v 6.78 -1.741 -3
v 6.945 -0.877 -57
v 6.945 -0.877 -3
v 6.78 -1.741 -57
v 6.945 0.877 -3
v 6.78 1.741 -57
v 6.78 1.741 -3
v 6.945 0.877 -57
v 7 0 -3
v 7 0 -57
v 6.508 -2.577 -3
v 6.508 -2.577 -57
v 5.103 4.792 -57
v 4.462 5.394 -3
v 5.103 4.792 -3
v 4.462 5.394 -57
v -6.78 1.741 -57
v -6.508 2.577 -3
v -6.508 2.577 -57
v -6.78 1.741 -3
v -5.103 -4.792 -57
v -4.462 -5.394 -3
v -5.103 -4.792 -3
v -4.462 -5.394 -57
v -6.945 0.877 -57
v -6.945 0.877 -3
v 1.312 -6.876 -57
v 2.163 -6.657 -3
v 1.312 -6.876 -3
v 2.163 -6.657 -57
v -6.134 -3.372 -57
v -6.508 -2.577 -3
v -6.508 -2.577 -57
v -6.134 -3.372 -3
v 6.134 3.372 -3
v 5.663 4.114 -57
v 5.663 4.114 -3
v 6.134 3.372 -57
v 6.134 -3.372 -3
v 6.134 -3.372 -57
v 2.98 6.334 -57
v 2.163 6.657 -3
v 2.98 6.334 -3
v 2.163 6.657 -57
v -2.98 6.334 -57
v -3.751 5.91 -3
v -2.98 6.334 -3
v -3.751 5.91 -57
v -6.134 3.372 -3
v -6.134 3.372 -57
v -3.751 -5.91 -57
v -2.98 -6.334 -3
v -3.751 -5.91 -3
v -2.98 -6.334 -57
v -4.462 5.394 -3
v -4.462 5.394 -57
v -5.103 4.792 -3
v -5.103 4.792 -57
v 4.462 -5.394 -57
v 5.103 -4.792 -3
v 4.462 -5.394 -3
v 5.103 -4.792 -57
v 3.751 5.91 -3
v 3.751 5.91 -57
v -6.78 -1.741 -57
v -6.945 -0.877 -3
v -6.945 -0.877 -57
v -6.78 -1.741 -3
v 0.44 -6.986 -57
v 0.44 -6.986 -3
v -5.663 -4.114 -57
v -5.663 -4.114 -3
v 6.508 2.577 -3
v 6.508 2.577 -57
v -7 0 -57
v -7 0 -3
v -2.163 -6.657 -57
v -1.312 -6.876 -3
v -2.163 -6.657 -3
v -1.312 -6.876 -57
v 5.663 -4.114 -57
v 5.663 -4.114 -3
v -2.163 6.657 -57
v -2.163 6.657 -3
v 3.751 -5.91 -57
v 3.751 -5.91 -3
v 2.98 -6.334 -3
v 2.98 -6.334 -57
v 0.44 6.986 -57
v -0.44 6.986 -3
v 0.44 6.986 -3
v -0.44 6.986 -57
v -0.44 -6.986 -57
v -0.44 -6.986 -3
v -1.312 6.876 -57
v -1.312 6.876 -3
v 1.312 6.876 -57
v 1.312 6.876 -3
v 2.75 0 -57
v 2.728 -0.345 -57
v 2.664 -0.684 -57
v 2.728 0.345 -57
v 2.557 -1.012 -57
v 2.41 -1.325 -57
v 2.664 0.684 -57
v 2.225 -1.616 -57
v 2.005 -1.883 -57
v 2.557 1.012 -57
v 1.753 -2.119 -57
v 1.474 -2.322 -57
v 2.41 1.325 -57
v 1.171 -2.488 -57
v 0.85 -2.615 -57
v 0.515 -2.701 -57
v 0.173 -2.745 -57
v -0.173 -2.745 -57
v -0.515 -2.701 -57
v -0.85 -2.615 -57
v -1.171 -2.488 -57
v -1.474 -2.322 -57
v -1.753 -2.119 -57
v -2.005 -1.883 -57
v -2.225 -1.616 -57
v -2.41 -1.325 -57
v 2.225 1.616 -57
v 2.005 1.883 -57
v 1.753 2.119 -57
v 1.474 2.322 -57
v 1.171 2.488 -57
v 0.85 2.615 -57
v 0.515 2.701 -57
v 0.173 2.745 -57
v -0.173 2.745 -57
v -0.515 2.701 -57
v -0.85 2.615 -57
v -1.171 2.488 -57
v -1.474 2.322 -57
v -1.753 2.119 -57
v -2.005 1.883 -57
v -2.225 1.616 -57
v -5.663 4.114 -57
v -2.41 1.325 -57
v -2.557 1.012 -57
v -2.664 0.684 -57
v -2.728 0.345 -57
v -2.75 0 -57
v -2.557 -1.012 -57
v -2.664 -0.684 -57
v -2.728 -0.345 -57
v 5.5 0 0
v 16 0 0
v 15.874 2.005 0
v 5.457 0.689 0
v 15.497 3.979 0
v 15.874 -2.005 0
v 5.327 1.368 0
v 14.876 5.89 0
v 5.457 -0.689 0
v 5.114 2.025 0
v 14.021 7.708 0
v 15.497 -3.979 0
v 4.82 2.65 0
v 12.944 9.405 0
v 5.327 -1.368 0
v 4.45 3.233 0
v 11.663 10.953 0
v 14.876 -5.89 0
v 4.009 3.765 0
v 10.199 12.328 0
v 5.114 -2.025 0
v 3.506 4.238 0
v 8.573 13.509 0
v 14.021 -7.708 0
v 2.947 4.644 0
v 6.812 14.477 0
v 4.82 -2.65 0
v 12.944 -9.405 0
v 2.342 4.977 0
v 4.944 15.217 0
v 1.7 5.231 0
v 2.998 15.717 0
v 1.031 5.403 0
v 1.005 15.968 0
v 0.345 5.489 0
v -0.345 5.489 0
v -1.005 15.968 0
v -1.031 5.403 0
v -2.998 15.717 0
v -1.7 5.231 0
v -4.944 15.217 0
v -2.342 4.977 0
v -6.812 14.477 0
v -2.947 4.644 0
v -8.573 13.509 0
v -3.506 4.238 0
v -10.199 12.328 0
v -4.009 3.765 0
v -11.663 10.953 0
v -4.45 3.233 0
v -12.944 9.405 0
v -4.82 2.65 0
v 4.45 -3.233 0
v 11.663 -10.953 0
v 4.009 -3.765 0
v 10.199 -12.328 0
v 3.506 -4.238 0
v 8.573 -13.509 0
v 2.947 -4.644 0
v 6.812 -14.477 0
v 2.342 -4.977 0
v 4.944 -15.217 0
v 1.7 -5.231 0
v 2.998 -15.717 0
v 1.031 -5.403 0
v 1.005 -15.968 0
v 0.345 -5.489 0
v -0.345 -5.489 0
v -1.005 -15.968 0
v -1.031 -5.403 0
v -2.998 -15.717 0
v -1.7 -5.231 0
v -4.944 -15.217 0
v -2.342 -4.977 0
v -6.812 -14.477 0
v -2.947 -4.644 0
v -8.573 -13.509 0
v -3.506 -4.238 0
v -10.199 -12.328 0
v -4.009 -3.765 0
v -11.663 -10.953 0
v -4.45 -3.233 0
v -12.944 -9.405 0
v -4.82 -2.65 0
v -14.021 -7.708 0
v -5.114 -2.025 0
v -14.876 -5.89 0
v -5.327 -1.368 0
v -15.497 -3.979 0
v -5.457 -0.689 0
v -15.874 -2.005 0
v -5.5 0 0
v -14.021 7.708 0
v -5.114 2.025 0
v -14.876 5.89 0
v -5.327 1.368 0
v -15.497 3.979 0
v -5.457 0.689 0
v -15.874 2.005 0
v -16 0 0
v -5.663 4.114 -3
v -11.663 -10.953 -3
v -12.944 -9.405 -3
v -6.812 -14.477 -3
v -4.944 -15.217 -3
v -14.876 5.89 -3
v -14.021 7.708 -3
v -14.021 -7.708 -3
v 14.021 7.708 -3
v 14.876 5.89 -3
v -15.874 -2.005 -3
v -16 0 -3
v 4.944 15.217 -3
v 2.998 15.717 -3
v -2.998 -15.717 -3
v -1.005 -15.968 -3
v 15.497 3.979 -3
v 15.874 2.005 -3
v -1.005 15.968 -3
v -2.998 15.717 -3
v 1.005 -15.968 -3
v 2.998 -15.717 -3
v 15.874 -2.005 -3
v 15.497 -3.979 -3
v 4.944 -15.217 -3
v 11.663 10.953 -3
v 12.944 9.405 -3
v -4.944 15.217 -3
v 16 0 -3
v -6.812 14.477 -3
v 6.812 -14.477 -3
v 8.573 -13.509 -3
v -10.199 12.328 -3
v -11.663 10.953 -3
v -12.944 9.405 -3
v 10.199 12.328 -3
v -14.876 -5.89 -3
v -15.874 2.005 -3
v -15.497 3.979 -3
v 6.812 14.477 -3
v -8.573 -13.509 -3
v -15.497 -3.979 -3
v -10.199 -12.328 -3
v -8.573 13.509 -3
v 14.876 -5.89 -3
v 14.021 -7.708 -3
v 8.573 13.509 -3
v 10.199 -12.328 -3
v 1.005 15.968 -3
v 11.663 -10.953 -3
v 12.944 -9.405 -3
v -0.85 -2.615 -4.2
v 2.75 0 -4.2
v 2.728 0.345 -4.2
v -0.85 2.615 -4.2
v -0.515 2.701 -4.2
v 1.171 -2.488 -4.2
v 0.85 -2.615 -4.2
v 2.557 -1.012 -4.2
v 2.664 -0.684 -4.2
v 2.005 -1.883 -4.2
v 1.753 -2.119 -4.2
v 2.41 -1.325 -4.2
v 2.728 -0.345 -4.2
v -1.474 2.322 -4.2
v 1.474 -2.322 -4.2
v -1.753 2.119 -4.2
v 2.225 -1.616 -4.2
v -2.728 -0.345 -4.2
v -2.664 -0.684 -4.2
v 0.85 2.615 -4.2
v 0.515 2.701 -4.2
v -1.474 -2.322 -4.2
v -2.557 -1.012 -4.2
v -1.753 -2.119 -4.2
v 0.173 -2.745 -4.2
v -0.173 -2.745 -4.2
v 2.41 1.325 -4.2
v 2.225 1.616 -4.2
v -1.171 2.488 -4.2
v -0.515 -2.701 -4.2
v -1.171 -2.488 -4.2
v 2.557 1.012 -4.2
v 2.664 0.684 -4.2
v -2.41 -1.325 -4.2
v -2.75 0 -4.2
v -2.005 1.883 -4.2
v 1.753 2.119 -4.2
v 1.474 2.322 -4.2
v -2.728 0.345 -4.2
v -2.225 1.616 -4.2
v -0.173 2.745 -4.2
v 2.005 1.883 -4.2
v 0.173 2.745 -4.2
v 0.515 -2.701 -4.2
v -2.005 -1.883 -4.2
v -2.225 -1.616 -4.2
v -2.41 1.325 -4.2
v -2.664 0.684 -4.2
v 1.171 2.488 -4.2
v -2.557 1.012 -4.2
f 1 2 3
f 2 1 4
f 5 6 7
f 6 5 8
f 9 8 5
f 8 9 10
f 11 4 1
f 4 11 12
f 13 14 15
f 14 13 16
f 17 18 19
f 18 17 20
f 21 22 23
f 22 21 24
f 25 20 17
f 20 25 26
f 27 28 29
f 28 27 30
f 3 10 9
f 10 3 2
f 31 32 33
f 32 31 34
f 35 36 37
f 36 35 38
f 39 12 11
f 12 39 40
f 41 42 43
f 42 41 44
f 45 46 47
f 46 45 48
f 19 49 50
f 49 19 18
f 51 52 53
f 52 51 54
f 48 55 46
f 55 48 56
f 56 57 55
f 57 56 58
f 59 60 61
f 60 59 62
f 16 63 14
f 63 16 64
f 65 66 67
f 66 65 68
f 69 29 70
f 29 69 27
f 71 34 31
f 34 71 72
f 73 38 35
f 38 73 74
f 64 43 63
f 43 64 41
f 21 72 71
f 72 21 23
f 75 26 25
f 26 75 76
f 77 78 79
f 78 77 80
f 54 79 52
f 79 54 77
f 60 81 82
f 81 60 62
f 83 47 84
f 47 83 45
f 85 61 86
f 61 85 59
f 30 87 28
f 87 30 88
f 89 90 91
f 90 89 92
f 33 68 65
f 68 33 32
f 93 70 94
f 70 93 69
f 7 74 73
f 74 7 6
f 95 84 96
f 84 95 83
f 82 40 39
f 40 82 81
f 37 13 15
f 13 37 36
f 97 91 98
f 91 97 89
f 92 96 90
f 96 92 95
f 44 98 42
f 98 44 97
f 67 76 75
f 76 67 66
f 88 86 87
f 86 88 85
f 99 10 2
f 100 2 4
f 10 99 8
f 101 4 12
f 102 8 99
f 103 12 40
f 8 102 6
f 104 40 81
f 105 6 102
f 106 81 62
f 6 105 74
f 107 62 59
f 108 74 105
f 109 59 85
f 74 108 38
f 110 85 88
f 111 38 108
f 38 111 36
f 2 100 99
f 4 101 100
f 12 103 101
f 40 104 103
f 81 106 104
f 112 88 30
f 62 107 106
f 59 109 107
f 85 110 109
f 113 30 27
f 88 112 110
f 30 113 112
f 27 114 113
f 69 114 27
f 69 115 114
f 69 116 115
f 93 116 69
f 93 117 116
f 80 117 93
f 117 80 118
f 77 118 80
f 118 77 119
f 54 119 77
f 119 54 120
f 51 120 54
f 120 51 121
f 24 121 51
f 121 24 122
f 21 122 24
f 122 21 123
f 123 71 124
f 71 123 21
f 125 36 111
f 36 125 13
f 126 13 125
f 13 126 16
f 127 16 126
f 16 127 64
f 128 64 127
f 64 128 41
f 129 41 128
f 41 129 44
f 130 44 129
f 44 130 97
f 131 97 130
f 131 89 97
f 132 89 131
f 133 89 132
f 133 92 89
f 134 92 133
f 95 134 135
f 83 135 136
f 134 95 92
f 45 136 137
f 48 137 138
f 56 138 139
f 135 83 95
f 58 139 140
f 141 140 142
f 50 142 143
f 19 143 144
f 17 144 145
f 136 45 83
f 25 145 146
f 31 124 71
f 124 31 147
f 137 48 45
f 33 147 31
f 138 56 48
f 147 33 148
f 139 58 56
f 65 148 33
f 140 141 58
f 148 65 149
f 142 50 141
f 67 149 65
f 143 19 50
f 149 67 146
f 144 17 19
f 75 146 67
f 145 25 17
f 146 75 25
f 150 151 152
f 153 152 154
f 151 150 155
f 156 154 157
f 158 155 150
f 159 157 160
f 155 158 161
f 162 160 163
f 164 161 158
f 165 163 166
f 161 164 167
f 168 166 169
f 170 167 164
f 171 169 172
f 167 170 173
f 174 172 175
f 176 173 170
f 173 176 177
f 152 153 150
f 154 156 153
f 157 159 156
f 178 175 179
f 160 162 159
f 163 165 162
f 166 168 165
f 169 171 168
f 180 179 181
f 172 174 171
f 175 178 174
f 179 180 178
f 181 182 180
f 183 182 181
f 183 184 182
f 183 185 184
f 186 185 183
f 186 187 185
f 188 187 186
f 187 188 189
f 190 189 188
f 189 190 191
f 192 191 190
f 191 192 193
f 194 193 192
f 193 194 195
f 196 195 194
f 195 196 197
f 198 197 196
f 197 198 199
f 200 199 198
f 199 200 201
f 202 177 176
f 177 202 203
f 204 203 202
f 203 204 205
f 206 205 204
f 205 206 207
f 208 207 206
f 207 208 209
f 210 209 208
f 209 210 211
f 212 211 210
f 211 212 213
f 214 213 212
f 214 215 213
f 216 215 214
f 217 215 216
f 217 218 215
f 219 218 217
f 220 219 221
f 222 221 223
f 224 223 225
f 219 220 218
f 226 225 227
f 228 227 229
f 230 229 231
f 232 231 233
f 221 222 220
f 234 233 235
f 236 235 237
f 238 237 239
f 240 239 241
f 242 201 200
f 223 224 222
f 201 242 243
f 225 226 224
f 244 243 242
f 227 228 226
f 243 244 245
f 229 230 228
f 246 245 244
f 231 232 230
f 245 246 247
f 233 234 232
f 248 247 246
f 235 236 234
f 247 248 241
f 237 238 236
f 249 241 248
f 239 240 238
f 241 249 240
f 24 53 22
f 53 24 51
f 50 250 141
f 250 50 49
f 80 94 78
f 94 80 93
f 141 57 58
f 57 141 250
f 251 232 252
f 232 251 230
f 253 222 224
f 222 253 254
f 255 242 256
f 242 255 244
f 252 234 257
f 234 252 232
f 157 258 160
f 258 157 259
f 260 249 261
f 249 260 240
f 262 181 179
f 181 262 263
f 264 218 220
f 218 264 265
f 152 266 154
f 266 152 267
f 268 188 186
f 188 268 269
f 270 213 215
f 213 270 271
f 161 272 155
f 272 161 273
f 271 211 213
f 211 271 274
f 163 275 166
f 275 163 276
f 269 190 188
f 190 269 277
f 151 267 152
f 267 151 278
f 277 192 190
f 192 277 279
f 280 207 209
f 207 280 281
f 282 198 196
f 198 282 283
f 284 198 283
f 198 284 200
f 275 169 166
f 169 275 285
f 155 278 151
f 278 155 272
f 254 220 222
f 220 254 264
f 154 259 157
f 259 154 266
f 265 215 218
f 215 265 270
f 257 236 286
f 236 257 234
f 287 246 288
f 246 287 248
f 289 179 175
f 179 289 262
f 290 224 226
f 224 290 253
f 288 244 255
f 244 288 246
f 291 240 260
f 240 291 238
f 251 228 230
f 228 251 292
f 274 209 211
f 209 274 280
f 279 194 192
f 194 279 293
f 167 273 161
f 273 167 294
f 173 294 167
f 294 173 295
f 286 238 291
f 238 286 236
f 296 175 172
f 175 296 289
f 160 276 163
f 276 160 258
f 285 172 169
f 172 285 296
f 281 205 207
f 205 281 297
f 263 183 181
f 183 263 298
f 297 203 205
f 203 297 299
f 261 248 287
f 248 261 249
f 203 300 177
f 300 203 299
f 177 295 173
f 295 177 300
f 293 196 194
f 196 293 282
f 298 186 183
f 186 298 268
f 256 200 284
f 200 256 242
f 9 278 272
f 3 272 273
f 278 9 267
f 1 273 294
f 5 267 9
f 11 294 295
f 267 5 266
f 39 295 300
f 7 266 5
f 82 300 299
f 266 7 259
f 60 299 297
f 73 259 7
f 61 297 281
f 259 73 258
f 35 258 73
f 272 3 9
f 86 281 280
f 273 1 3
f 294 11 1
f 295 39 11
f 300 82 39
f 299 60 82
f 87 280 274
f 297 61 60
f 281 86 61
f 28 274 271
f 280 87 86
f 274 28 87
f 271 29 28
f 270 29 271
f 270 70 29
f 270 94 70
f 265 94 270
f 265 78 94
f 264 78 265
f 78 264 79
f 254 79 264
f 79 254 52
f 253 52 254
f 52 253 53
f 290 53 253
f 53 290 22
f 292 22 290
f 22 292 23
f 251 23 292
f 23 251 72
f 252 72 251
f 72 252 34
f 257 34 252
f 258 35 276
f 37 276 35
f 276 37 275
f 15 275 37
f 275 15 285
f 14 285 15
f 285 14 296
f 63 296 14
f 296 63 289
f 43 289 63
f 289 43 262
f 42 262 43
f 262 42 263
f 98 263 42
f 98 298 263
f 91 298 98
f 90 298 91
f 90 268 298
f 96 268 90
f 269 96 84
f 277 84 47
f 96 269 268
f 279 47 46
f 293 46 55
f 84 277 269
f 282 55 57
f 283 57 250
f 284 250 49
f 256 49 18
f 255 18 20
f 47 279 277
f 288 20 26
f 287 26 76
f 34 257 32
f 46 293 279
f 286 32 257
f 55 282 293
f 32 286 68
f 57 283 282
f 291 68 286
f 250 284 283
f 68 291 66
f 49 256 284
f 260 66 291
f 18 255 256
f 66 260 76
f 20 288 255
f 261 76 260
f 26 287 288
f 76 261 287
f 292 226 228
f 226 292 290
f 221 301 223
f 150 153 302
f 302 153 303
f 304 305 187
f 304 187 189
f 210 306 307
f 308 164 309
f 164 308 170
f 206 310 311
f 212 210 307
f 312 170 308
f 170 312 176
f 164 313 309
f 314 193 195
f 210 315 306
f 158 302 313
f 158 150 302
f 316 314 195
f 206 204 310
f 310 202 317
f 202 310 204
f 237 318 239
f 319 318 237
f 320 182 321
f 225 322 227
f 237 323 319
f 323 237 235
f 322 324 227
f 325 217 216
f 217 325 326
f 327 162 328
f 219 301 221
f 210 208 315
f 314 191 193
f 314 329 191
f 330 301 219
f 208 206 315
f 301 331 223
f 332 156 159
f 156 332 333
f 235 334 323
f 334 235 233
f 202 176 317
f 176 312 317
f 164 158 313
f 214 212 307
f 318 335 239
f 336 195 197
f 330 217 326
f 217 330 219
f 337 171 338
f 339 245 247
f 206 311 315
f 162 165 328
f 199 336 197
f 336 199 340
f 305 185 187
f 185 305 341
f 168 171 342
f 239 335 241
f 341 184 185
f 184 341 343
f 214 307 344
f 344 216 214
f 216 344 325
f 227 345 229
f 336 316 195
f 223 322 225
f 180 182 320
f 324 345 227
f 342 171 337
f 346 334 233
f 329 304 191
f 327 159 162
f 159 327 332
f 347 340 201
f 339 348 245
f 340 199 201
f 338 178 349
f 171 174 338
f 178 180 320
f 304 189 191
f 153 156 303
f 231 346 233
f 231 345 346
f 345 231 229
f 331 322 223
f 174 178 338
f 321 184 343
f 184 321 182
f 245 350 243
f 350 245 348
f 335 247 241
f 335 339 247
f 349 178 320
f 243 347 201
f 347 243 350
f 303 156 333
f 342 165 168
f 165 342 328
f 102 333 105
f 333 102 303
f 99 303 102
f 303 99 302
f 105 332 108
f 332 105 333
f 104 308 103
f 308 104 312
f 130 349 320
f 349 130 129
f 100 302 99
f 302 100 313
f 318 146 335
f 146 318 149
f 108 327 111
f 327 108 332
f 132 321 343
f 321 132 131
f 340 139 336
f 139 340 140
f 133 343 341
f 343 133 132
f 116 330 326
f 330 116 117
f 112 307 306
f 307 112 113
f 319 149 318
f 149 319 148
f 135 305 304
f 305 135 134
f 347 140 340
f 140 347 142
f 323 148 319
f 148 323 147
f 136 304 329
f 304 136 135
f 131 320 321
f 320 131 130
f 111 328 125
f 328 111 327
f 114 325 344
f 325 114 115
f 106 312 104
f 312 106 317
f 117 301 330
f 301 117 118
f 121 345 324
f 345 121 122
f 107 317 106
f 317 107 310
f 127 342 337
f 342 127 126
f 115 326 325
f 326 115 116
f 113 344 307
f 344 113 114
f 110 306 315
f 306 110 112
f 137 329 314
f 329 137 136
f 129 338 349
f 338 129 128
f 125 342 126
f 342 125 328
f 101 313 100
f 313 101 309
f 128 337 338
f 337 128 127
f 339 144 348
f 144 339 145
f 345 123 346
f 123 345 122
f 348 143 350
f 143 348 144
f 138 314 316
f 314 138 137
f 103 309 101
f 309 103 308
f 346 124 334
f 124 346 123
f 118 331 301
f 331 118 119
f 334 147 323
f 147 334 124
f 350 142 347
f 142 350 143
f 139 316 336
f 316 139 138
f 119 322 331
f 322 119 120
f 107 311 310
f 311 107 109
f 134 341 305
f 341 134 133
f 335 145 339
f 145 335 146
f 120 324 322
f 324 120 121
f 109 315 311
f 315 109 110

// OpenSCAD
$fn = 50;


difference() {
	union() {
		translate(v = [0, 0, -57.0000000000]) {
			cylinder(h = 57, r = 7.0000000000);
		}
		translate(v = [0, 0, -3.0000000000]) {
			cylinder(h = 3, r = 16.0000000000);
		}
	}
	union() {
		translate(v = [0, 0, 0]) {
			rotate(a = [0, 0, 0]) {
				difference() {
					union() {
						#translate(v = [0, 0, -57.0000000000]) {
							cylinder(h = 57, r = 2.2500000000);
						}
						#translate(v = [0, 0, -4.2000000000]) {
							cylinder(h = 4.2000000000, r1 = 2.7500000000, r2 = 5.5000000000);
						}
						#translate(v = [0, 0, -57.0000000000]) {
							cylinder(h = 57, r = 2.7500000000);
						}
						#translate(v = [0, 0, -57.0000000000]) {
							cylinder(h = 57, r = 2.2500000000);
						}
					}
					union();
				}
			}
		}
	}
}
